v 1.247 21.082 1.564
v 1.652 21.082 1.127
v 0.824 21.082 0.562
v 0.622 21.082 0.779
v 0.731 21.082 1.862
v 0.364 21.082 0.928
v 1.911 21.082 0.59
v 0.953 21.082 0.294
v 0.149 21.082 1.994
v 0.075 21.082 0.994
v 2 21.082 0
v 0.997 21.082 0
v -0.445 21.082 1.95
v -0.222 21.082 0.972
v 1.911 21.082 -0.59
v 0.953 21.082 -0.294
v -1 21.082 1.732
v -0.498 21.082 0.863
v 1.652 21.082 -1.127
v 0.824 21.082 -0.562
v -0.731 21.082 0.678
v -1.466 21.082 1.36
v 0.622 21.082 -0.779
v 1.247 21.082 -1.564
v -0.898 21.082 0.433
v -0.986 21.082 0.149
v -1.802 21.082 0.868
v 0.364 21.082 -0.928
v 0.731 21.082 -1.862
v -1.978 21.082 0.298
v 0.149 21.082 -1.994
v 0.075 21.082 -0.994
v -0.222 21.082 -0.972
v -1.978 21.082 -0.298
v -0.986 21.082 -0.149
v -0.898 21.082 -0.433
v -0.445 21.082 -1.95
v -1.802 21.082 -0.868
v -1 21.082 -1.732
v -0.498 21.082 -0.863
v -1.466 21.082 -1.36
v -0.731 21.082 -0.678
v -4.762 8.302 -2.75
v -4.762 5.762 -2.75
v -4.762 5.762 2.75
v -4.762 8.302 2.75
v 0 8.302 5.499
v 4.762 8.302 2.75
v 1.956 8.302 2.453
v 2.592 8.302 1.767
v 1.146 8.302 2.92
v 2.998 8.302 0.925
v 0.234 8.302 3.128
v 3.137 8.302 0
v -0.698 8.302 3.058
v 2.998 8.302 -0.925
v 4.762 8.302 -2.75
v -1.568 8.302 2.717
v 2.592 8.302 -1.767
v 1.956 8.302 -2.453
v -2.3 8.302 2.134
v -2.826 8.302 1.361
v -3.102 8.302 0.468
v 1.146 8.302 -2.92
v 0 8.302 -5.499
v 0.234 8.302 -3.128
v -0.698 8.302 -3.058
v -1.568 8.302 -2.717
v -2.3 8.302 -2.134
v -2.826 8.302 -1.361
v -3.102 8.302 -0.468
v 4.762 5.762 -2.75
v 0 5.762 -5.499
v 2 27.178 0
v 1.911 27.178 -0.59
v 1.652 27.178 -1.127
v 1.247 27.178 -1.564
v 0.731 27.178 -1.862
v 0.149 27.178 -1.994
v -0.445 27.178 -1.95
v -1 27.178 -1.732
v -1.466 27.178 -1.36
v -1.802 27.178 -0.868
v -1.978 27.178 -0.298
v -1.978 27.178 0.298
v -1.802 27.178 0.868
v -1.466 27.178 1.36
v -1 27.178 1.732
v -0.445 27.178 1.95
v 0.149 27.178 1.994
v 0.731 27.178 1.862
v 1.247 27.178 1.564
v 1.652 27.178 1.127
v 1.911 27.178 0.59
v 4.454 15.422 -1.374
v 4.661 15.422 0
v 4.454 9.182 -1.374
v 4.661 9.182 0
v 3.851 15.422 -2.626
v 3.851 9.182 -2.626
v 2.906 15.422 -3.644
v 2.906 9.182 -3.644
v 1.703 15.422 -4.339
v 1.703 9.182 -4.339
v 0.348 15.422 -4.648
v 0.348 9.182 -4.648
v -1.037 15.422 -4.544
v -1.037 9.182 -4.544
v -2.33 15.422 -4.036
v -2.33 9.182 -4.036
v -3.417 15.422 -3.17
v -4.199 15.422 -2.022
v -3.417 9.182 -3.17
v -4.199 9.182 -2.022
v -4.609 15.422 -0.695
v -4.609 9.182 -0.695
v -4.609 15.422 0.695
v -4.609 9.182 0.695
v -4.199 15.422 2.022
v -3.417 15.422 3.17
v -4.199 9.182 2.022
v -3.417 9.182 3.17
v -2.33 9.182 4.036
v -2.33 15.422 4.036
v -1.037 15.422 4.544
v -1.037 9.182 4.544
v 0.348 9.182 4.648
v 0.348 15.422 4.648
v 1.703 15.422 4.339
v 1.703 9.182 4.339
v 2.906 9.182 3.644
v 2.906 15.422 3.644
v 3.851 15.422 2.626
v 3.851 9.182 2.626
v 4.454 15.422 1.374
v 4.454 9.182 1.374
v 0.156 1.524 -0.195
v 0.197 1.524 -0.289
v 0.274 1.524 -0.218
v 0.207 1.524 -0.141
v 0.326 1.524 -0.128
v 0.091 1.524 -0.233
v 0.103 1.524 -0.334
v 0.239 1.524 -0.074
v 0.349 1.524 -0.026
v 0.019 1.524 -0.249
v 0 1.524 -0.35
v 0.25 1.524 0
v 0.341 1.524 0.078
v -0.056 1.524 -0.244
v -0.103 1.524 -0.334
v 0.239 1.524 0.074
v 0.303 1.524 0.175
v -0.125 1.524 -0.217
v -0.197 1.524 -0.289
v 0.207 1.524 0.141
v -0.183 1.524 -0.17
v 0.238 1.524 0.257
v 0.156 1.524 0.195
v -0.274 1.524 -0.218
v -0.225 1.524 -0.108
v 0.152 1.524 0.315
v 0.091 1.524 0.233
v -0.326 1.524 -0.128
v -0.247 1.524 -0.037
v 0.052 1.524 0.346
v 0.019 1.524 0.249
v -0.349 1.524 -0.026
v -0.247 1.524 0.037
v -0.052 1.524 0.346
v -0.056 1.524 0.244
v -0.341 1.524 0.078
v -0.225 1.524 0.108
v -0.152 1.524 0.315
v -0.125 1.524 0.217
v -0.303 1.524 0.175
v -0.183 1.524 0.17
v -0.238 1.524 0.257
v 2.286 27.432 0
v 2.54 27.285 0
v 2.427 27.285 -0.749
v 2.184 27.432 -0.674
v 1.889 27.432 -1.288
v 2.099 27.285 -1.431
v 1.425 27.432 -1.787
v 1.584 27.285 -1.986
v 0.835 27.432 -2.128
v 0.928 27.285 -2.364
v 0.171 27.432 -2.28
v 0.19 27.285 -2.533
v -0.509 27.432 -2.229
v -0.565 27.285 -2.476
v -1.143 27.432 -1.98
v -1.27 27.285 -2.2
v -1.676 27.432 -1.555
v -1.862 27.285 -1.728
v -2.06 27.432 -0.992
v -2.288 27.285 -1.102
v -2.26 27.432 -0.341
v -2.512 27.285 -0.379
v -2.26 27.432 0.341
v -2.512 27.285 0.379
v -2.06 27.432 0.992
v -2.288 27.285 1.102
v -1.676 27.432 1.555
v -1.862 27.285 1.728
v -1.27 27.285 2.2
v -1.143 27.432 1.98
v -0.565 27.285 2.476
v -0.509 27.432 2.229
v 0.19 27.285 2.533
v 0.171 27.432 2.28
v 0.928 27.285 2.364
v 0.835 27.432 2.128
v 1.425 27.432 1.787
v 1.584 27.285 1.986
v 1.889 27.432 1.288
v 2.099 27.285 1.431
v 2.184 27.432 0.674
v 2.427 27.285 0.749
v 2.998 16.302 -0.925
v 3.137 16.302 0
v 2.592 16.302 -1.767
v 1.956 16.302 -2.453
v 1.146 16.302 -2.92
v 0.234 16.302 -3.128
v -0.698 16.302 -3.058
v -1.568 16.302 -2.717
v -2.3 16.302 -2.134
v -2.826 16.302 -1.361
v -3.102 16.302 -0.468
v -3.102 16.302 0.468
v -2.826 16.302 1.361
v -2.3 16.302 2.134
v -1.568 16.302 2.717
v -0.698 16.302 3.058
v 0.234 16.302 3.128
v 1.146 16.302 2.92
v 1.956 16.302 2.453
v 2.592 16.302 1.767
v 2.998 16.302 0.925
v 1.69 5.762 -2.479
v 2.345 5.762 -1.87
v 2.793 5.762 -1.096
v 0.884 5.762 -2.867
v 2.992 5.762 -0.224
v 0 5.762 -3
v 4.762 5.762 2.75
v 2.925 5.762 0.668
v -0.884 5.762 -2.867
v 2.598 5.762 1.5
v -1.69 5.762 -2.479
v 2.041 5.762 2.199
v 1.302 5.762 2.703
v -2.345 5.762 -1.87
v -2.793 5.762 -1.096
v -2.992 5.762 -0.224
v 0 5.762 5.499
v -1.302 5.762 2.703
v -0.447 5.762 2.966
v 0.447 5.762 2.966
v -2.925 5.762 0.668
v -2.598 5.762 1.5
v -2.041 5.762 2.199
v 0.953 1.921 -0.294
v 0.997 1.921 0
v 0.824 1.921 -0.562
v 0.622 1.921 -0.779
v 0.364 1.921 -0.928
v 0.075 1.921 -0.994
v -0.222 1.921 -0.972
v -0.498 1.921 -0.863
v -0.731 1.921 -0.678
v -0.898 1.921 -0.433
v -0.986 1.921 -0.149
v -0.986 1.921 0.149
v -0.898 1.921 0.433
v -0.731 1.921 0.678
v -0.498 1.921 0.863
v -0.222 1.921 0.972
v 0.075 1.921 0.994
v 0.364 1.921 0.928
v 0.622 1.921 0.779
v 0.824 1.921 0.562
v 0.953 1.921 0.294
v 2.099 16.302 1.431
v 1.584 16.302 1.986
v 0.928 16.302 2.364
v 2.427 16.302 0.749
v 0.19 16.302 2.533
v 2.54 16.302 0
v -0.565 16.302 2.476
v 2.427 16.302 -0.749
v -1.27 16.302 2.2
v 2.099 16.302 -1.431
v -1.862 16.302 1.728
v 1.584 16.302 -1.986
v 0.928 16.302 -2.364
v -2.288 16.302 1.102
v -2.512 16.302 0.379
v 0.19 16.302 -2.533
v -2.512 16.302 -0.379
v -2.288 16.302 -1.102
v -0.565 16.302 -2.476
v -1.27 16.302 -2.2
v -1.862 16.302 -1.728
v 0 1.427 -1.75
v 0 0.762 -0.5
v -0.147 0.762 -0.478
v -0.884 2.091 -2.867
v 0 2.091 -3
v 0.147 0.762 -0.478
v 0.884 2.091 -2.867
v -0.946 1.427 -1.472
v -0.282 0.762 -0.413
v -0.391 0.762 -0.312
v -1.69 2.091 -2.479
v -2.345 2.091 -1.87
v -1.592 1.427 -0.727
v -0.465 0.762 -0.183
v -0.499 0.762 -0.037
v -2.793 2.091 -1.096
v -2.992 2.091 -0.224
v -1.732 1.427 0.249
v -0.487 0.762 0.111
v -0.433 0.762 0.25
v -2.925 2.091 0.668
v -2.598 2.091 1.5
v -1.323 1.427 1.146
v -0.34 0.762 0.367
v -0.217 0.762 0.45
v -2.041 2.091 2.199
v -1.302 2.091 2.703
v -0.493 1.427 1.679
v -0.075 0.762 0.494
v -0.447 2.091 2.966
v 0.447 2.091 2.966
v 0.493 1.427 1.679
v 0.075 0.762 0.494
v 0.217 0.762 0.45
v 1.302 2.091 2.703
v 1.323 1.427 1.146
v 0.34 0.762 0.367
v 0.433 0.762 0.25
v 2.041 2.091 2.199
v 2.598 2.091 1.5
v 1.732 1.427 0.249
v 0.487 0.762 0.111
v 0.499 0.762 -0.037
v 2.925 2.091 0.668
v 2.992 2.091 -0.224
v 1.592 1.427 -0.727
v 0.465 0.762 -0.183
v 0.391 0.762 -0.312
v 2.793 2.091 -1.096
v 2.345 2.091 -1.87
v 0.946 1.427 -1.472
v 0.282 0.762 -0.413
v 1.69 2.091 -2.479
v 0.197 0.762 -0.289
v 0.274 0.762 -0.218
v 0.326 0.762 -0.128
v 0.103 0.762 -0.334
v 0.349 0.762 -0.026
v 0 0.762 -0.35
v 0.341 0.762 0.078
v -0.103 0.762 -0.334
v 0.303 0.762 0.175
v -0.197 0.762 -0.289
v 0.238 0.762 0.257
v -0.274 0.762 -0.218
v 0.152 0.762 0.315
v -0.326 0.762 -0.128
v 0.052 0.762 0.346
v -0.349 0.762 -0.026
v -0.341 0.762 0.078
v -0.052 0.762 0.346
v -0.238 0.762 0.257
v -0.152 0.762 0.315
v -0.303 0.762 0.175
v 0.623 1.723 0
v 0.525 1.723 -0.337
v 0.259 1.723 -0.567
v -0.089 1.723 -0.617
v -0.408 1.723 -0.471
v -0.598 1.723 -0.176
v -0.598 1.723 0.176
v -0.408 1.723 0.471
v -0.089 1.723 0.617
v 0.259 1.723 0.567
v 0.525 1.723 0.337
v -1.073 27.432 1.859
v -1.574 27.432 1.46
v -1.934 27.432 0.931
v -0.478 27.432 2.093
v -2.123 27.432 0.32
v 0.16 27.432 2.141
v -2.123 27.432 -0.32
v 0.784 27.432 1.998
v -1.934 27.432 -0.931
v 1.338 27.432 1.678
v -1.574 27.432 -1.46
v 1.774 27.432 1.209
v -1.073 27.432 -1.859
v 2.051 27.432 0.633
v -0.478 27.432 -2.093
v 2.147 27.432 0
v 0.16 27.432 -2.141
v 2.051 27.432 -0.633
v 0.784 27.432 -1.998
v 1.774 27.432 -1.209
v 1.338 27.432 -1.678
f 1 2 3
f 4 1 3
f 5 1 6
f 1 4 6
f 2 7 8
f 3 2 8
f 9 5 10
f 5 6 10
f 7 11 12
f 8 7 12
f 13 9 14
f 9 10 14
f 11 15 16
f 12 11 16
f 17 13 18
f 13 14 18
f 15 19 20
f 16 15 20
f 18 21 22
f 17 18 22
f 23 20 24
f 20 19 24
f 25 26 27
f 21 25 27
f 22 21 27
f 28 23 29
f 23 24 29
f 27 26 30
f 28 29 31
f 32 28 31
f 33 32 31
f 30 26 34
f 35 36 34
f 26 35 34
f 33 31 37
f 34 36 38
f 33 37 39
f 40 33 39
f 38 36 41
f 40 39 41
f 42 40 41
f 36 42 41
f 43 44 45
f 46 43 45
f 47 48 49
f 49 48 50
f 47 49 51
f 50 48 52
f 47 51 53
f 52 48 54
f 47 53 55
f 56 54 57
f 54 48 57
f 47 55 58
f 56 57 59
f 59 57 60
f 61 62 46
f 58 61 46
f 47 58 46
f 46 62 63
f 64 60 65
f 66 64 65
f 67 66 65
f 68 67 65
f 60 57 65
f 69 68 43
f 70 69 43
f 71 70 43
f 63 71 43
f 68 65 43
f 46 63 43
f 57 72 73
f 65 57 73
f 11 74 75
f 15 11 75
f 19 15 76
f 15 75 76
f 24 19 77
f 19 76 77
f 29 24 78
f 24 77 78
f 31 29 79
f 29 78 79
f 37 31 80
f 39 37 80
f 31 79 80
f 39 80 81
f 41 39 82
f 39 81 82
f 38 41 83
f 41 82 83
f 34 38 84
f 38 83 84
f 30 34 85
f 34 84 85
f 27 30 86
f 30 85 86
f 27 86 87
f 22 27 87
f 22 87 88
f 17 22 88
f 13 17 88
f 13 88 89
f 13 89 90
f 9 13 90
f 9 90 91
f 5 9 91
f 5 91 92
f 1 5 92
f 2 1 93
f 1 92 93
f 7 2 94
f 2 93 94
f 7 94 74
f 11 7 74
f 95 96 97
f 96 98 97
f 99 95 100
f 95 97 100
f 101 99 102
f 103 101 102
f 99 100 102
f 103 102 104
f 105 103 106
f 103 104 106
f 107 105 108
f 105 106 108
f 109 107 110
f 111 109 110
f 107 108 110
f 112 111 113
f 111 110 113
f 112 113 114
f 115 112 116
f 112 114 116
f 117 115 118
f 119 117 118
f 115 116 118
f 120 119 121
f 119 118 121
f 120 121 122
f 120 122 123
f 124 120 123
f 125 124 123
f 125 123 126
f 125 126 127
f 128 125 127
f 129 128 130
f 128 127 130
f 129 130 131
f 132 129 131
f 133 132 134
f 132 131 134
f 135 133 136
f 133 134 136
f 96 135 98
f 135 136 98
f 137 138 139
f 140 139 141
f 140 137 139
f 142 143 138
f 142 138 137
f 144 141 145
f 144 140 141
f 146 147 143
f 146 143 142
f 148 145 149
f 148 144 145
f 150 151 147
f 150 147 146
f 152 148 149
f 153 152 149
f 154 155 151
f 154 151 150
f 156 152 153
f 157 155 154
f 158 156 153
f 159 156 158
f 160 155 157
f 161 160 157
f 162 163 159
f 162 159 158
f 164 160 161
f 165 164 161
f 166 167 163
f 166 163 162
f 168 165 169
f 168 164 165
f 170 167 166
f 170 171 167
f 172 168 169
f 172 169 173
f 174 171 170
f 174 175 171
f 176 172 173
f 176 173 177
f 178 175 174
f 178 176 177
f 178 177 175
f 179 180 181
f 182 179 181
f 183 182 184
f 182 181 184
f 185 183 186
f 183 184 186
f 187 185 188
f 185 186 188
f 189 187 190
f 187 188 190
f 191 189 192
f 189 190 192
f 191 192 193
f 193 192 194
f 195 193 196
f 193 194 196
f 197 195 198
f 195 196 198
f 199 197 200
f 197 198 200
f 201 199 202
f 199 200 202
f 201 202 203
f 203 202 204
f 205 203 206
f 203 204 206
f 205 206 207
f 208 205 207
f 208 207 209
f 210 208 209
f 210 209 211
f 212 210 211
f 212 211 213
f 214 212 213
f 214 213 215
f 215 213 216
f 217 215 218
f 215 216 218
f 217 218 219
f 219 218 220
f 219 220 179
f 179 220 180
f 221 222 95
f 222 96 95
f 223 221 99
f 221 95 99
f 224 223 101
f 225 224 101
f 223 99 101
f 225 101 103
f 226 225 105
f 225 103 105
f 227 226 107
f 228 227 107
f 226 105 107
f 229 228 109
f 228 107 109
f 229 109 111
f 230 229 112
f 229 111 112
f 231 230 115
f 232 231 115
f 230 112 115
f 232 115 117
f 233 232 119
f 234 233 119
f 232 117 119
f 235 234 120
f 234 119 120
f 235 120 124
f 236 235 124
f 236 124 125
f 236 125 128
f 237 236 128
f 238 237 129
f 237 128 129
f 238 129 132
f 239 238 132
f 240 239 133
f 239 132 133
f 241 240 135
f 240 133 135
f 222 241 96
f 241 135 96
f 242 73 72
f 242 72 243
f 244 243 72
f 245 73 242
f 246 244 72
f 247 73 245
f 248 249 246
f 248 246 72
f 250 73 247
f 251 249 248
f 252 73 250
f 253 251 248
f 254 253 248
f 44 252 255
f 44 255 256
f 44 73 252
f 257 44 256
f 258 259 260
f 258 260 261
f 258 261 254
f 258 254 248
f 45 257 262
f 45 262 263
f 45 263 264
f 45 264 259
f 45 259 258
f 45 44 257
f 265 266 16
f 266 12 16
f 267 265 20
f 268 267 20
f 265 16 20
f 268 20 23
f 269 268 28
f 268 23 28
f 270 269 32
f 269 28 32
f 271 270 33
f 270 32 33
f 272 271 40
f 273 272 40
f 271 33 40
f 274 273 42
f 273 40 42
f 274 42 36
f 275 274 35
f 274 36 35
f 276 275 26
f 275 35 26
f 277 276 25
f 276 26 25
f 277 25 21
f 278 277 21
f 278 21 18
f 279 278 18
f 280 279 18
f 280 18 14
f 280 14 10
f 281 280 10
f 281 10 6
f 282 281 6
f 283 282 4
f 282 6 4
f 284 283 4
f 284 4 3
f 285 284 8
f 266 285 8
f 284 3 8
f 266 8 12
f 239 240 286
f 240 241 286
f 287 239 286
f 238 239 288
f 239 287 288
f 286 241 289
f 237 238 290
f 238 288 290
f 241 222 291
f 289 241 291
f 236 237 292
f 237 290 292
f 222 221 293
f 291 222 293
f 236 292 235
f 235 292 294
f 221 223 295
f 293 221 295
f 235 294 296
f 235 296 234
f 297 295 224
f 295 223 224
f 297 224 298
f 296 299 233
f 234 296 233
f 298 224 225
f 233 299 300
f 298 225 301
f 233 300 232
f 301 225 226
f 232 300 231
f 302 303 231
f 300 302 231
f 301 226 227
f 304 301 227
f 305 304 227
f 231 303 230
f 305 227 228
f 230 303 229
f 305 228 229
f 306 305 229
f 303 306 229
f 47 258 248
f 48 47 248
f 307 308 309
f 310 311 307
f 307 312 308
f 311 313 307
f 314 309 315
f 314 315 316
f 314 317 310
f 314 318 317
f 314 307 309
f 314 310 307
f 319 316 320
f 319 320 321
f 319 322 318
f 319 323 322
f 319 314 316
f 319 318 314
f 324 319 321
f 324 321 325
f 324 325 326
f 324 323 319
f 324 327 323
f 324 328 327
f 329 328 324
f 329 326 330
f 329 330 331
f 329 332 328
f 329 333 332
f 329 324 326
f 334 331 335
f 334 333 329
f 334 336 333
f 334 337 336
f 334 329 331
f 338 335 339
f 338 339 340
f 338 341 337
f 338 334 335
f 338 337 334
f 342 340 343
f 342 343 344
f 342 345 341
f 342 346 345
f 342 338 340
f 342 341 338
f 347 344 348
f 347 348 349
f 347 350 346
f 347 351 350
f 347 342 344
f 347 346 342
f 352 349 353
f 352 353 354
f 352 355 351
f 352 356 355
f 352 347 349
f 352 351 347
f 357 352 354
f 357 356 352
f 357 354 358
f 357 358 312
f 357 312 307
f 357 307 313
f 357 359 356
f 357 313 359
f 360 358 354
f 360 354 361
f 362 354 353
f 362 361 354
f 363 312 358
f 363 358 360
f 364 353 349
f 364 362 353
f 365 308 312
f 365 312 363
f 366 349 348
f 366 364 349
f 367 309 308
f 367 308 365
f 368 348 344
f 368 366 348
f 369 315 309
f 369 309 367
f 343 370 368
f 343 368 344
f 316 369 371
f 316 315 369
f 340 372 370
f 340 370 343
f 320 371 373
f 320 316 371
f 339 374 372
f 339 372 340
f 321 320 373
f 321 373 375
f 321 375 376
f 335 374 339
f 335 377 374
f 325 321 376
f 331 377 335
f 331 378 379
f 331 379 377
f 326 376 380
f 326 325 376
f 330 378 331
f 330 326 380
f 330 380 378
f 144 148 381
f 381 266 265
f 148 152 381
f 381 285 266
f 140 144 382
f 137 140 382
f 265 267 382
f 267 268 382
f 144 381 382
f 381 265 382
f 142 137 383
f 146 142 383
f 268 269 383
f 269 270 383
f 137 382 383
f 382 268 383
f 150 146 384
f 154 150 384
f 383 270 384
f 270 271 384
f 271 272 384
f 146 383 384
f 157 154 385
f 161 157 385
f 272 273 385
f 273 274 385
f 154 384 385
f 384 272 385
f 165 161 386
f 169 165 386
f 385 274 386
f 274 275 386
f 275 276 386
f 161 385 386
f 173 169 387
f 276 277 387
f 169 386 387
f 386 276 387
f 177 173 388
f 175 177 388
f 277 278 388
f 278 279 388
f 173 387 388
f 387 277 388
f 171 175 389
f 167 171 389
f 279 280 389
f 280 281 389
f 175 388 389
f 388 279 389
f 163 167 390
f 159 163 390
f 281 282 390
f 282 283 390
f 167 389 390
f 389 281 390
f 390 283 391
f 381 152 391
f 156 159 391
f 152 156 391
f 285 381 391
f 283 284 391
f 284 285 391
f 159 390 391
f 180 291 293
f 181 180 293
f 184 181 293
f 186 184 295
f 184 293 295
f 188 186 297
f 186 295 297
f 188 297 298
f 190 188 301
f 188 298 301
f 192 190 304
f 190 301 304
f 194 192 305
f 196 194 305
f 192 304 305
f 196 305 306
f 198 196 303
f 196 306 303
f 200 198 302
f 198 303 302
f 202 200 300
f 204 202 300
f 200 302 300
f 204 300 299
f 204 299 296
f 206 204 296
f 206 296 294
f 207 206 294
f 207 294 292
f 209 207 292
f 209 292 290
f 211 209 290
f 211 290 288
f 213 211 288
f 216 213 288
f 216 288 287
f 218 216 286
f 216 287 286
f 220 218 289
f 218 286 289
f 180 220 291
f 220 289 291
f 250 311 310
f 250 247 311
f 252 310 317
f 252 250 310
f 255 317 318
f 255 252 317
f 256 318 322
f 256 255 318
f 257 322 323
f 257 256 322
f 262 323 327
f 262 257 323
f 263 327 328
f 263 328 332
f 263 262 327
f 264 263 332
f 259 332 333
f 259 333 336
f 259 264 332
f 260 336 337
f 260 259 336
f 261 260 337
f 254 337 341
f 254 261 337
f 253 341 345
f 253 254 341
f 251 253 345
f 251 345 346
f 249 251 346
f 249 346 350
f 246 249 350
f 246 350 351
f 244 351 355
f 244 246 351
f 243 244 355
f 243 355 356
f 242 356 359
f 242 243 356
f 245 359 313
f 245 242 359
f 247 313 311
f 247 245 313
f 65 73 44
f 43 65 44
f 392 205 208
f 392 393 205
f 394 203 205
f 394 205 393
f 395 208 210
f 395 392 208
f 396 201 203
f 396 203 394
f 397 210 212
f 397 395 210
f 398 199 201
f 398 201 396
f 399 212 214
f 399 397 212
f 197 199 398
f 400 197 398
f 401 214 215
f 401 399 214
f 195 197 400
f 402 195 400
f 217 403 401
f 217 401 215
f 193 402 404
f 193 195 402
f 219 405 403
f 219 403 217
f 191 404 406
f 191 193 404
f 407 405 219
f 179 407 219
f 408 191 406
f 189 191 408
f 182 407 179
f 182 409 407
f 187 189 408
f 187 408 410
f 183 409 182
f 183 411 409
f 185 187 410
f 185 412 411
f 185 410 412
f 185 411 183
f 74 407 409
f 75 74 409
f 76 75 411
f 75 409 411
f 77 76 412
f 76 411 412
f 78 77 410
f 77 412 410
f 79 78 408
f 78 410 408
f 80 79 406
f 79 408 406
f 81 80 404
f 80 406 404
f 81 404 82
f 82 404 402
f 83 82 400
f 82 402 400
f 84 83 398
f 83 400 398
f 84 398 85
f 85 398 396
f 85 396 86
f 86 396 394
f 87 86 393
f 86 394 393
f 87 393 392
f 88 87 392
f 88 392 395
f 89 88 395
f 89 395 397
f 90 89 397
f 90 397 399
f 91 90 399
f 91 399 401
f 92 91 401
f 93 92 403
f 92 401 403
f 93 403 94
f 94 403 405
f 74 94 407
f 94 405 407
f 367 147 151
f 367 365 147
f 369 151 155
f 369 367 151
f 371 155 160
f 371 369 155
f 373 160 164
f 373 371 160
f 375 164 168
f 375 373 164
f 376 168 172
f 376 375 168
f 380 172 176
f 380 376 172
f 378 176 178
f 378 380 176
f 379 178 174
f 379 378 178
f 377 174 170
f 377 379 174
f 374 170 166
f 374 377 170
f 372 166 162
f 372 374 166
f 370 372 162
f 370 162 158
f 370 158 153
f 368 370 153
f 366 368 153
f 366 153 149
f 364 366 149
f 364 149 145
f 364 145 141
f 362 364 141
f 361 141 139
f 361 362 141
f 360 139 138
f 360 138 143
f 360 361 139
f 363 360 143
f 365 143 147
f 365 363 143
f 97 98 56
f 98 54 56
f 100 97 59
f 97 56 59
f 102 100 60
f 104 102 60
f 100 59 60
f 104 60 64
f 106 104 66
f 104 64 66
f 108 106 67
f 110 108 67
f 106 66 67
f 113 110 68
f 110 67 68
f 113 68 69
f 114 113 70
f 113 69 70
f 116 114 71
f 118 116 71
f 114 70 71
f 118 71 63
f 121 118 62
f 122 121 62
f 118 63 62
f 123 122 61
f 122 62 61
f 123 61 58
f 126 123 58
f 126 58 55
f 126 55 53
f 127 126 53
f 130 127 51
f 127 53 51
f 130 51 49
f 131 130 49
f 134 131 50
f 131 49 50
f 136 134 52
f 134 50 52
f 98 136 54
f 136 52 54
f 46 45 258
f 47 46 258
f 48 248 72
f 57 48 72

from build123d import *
from OCP.BRepFilletAPI import BRepFilletAPI_MakeChamfer

# Parameters (mm, degrees)
BOSS_EXTRUDE1_DEPTH = 27.432
CHAMFER1_SIZE       = 0.254
CHAMFER1_SIZE2      = 0.146646968


# Read off the part's stored shape, not the designer's step: Cut-Revolve4
with BuildPart() as part:
    # Sketch3 → Boss-Extrude1 (new body)
    with BuildSketch(Plane(origin=(0, 0, 0), x_dir=(1, 0, 0), z_dir=(0, 1, 0))):
        Polygon((4.7625, 2.749630657), (0, 5.499261314), (-4.7625, 2.749630657), (-4.7625, -2.749630657), (0, -5.499261314), (4.7625, -2.749630657), align=None)
    extrude(amount=BOSS_EXTRUDE1_DEPTH)

    # Cut-Revolve4 outline → Cut-Revolve4 (revolve, cut)
    with BuildSketch(Plane.XY):
        Polygon((4.6609, 9.18188181), (3.1369, 8.302), (5.499261314, 8.302), (5.499261314, 27.432), (2.54, 27.432), (2.54, 16.302), (3.1369, 16.302), (4.6609, 15.42211819), align=None)
        Polygon((0.99695, 21.082), (2, 21.082), (2, 27.432), (0, 27.432), (0, 1.391072642), (0.99695, 1.92116036), align=None)
    revolve(axis=Axis((0, 0, 0), (0, 1, 0)), mode=Mode.SUBTRACT)

    # Chamfer1: one chamfer whose edges measure the first distance from different faces: ONE call of the kernel's chamfer builder (chamfer() names one face for all edges)
    chamfer1_edges_1 = [part.edges().sort_by_distance(p)[0] for p in [
        (-2.54, 27.432, 0),
    ]]
    chamfer1_side_1 = [part.faces().sort_by_distance(p)[0] for p in [
        (-2.468157951, 27.432, 0),
    ]]
    chamfer1_edges_2 = [part.edges().sort_by_distance(p)[0] for p in [
        (-2, 27.432, 0),
    ]]
    chamfer1_side_2 = [part.faces().sort_by_distance(p)[0] for p in [
        (-2, 24.257, 0),
    ]]
    chamfer1 = BRepFilletAPI_MakeChamfer(part.part.solid().wrapped)
    for e in chamfer1_edges_1:
        chamfer1.Add(CHAMFER1_SIZE, CHAMFER1_SIZE2, e.wrapped, chamfer1_side_1[0].wrapped)  # the first distance lies on this face
    for e in chamfer1_edges_2:
        chamfer1.Add(CHAMFER1_SIZE, CHAMFER1_SIZE2, e.wrapped, chamfer1_side_2[0].wrapped)  # the first distance lies on this face
    add(Compound.cast(chamfer1.Shape()), mode=Mode.REPLACE)

    # Sketch4 → Cut-Revolve5 (revolve, cut)
    with BuildSketch(Plane.XY, mode=Mode.PRIVATE) as cut_revolve5_sk:
        Polygon((-0.35, 0.762), (-0.5, 0.762), (-3, 2.091273579), (-3, 5.762), (-6.107414125, 5.762), (-6.107414125, 0), (0, 0), (0, 1.524), (-0.35, 1.524), align=None)
    revolve(cut_revolve5_sk.sketch.rotate(Axis((0, 0, 0), (0, 1, 0)), 270), axis=Axis((0, 0, 0), (0, 1, 0)), mode=Mode.SUBTRACT)


solid = part.part
